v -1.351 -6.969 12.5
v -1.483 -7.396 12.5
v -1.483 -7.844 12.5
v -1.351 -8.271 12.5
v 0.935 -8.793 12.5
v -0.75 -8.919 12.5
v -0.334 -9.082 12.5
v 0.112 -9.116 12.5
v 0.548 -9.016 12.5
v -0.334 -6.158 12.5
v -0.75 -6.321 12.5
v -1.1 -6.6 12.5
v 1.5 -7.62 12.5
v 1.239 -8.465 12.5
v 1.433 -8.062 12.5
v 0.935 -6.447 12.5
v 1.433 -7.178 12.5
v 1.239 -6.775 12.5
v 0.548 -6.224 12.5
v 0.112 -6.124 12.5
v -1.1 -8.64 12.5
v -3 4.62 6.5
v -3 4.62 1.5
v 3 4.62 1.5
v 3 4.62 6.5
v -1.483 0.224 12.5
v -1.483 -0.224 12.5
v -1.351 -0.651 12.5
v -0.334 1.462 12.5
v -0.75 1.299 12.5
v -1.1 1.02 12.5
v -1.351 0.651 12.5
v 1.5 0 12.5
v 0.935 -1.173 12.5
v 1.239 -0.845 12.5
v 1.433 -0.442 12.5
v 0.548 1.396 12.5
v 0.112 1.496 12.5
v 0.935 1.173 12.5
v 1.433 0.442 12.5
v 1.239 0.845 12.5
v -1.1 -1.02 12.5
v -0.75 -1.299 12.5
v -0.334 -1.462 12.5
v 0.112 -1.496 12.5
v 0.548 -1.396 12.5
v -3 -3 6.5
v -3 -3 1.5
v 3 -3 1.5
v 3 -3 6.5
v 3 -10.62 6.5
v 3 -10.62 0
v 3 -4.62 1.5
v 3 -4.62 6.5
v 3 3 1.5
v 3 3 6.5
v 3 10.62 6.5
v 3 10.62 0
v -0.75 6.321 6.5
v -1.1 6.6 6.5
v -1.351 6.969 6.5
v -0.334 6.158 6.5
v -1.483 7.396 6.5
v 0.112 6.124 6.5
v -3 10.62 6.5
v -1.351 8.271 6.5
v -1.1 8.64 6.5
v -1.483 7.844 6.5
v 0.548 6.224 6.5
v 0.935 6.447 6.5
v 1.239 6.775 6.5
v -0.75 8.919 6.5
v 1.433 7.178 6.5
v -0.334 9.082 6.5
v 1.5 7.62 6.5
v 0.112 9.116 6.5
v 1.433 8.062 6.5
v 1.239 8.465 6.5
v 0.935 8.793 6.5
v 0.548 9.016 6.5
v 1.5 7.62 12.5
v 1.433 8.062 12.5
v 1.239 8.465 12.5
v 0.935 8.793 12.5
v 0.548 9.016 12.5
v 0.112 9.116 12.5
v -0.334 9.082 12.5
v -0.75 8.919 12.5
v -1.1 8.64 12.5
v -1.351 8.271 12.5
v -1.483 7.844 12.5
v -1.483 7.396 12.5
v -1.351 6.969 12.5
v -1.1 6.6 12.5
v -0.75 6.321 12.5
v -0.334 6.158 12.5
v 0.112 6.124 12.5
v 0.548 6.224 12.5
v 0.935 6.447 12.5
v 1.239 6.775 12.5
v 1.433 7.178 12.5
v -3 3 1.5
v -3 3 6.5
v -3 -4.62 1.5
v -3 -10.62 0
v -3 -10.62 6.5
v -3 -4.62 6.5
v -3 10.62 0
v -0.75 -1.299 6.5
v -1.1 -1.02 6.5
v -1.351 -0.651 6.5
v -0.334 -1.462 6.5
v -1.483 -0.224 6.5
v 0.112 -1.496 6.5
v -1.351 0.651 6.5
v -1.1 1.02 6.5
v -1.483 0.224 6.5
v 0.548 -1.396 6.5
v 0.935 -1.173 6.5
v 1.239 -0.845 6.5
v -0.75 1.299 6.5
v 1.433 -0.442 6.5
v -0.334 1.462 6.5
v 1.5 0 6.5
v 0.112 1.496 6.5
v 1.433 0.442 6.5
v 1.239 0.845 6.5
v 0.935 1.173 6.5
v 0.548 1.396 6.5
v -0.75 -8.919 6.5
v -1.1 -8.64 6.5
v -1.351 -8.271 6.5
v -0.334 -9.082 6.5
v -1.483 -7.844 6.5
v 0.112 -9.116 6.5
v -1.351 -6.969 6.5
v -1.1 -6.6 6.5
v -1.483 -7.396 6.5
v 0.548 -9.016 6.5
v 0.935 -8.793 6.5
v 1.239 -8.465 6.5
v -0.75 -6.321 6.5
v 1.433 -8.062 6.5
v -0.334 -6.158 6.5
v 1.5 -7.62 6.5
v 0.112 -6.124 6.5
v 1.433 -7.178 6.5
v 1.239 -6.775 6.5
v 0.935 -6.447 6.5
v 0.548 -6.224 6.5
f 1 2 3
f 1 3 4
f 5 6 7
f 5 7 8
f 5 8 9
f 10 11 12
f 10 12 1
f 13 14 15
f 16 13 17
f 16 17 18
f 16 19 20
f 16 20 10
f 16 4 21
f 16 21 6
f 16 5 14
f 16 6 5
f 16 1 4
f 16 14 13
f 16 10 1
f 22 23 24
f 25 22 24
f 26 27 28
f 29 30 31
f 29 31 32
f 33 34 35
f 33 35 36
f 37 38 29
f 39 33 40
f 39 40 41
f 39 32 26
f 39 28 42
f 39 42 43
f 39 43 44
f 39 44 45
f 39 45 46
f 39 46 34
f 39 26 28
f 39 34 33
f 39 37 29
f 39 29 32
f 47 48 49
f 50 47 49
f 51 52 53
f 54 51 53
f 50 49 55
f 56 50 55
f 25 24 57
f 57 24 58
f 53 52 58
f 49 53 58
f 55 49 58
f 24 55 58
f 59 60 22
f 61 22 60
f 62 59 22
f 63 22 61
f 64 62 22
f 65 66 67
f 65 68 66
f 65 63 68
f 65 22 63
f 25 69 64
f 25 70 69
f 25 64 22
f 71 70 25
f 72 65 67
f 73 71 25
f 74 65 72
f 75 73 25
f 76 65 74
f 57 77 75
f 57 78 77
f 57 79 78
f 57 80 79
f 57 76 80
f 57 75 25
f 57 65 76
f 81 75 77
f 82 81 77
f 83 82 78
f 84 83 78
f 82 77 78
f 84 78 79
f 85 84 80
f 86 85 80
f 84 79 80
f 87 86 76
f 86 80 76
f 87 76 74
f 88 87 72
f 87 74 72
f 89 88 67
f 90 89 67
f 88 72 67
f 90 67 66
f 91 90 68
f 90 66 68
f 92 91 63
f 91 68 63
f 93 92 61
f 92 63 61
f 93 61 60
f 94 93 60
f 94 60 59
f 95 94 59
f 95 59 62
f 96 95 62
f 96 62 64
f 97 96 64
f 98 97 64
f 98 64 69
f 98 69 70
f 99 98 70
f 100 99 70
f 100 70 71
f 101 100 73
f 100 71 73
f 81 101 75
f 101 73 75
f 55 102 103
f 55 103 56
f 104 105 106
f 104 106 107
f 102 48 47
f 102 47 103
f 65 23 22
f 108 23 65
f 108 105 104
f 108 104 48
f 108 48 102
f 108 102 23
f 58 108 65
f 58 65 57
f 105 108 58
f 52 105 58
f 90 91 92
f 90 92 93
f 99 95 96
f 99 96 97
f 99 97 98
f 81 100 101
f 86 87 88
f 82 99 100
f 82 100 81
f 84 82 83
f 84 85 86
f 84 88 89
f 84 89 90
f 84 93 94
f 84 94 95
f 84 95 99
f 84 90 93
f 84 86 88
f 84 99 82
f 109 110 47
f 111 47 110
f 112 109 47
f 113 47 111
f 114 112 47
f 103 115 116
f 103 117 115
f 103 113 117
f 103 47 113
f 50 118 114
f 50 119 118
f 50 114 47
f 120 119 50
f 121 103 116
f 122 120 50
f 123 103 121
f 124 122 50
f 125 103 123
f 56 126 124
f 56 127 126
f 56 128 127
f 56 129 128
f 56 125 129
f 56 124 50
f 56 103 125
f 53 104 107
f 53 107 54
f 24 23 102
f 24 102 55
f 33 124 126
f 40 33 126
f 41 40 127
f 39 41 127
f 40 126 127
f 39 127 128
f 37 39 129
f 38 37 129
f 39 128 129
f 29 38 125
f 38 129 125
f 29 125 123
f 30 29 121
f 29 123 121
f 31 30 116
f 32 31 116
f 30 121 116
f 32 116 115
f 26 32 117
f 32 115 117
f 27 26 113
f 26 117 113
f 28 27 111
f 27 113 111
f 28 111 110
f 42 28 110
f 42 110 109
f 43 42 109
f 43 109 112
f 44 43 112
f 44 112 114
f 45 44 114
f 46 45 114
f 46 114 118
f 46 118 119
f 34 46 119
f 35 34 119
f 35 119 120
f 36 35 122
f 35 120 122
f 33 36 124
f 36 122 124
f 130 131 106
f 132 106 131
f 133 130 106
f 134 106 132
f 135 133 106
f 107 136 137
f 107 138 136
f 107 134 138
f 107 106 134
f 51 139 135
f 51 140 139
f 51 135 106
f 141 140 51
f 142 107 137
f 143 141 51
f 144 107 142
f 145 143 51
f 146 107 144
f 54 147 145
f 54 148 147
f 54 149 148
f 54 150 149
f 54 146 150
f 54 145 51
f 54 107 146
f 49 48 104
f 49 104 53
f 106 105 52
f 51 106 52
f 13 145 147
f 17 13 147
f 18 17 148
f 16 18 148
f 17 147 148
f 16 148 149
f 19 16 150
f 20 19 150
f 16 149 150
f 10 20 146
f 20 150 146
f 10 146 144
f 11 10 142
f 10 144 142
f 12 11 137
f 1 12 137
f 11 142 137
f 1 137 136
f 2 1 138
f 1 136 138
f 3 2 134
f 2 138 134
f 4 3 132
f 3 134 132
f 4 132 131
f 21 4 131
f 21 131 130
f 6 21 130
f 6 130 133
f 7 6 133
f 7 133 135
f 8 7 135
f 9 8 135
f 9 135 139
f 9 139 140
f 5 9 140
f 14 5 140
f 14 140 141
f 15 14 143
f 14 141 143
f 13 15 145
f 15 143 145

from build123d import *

# Parameters (mm, degrees)
F0_W     = 6
F0_H     = 21.24
F1_DEPTH = 1.5
F2_W     = 6
F2_H     = 6
F3_DEPTH = 5
F4_R     = 1.5
F5_DEPTH = 6


with BuildPart() as f1:
    # F0 (on Top) → F1 (new body)
    with BuildSketch(Plane.XY):
        Rectangle(F0_W, F0_H)
    extrude(amount=F1_DEPTH)

    # F2 (on face) → F3 (join)
    with BuildSketch(Plane.XY.offset(1.5)):
        with Locations((0, 7.62)):
            Rectangle(F2_W, F2_H)
        Rectangle(F2_W, F2_H)
        with Locations((0, -7.62)):
            Rectangle(F2_W, F2_H)
    extrude(amount=F3_DEPTH)

    # F4 (on face) → F5 (join)
    with BuildSketch(Plane.XY.offset(6.5)):
        Circle(F4_R)
        with Locations((0, 7.62)):
            Circle(F4_R)
        with Locations((0, -7.62)):
            Circle(F4_R)
    extrude(amount=F5_DEPTH)


solid = f1.part
